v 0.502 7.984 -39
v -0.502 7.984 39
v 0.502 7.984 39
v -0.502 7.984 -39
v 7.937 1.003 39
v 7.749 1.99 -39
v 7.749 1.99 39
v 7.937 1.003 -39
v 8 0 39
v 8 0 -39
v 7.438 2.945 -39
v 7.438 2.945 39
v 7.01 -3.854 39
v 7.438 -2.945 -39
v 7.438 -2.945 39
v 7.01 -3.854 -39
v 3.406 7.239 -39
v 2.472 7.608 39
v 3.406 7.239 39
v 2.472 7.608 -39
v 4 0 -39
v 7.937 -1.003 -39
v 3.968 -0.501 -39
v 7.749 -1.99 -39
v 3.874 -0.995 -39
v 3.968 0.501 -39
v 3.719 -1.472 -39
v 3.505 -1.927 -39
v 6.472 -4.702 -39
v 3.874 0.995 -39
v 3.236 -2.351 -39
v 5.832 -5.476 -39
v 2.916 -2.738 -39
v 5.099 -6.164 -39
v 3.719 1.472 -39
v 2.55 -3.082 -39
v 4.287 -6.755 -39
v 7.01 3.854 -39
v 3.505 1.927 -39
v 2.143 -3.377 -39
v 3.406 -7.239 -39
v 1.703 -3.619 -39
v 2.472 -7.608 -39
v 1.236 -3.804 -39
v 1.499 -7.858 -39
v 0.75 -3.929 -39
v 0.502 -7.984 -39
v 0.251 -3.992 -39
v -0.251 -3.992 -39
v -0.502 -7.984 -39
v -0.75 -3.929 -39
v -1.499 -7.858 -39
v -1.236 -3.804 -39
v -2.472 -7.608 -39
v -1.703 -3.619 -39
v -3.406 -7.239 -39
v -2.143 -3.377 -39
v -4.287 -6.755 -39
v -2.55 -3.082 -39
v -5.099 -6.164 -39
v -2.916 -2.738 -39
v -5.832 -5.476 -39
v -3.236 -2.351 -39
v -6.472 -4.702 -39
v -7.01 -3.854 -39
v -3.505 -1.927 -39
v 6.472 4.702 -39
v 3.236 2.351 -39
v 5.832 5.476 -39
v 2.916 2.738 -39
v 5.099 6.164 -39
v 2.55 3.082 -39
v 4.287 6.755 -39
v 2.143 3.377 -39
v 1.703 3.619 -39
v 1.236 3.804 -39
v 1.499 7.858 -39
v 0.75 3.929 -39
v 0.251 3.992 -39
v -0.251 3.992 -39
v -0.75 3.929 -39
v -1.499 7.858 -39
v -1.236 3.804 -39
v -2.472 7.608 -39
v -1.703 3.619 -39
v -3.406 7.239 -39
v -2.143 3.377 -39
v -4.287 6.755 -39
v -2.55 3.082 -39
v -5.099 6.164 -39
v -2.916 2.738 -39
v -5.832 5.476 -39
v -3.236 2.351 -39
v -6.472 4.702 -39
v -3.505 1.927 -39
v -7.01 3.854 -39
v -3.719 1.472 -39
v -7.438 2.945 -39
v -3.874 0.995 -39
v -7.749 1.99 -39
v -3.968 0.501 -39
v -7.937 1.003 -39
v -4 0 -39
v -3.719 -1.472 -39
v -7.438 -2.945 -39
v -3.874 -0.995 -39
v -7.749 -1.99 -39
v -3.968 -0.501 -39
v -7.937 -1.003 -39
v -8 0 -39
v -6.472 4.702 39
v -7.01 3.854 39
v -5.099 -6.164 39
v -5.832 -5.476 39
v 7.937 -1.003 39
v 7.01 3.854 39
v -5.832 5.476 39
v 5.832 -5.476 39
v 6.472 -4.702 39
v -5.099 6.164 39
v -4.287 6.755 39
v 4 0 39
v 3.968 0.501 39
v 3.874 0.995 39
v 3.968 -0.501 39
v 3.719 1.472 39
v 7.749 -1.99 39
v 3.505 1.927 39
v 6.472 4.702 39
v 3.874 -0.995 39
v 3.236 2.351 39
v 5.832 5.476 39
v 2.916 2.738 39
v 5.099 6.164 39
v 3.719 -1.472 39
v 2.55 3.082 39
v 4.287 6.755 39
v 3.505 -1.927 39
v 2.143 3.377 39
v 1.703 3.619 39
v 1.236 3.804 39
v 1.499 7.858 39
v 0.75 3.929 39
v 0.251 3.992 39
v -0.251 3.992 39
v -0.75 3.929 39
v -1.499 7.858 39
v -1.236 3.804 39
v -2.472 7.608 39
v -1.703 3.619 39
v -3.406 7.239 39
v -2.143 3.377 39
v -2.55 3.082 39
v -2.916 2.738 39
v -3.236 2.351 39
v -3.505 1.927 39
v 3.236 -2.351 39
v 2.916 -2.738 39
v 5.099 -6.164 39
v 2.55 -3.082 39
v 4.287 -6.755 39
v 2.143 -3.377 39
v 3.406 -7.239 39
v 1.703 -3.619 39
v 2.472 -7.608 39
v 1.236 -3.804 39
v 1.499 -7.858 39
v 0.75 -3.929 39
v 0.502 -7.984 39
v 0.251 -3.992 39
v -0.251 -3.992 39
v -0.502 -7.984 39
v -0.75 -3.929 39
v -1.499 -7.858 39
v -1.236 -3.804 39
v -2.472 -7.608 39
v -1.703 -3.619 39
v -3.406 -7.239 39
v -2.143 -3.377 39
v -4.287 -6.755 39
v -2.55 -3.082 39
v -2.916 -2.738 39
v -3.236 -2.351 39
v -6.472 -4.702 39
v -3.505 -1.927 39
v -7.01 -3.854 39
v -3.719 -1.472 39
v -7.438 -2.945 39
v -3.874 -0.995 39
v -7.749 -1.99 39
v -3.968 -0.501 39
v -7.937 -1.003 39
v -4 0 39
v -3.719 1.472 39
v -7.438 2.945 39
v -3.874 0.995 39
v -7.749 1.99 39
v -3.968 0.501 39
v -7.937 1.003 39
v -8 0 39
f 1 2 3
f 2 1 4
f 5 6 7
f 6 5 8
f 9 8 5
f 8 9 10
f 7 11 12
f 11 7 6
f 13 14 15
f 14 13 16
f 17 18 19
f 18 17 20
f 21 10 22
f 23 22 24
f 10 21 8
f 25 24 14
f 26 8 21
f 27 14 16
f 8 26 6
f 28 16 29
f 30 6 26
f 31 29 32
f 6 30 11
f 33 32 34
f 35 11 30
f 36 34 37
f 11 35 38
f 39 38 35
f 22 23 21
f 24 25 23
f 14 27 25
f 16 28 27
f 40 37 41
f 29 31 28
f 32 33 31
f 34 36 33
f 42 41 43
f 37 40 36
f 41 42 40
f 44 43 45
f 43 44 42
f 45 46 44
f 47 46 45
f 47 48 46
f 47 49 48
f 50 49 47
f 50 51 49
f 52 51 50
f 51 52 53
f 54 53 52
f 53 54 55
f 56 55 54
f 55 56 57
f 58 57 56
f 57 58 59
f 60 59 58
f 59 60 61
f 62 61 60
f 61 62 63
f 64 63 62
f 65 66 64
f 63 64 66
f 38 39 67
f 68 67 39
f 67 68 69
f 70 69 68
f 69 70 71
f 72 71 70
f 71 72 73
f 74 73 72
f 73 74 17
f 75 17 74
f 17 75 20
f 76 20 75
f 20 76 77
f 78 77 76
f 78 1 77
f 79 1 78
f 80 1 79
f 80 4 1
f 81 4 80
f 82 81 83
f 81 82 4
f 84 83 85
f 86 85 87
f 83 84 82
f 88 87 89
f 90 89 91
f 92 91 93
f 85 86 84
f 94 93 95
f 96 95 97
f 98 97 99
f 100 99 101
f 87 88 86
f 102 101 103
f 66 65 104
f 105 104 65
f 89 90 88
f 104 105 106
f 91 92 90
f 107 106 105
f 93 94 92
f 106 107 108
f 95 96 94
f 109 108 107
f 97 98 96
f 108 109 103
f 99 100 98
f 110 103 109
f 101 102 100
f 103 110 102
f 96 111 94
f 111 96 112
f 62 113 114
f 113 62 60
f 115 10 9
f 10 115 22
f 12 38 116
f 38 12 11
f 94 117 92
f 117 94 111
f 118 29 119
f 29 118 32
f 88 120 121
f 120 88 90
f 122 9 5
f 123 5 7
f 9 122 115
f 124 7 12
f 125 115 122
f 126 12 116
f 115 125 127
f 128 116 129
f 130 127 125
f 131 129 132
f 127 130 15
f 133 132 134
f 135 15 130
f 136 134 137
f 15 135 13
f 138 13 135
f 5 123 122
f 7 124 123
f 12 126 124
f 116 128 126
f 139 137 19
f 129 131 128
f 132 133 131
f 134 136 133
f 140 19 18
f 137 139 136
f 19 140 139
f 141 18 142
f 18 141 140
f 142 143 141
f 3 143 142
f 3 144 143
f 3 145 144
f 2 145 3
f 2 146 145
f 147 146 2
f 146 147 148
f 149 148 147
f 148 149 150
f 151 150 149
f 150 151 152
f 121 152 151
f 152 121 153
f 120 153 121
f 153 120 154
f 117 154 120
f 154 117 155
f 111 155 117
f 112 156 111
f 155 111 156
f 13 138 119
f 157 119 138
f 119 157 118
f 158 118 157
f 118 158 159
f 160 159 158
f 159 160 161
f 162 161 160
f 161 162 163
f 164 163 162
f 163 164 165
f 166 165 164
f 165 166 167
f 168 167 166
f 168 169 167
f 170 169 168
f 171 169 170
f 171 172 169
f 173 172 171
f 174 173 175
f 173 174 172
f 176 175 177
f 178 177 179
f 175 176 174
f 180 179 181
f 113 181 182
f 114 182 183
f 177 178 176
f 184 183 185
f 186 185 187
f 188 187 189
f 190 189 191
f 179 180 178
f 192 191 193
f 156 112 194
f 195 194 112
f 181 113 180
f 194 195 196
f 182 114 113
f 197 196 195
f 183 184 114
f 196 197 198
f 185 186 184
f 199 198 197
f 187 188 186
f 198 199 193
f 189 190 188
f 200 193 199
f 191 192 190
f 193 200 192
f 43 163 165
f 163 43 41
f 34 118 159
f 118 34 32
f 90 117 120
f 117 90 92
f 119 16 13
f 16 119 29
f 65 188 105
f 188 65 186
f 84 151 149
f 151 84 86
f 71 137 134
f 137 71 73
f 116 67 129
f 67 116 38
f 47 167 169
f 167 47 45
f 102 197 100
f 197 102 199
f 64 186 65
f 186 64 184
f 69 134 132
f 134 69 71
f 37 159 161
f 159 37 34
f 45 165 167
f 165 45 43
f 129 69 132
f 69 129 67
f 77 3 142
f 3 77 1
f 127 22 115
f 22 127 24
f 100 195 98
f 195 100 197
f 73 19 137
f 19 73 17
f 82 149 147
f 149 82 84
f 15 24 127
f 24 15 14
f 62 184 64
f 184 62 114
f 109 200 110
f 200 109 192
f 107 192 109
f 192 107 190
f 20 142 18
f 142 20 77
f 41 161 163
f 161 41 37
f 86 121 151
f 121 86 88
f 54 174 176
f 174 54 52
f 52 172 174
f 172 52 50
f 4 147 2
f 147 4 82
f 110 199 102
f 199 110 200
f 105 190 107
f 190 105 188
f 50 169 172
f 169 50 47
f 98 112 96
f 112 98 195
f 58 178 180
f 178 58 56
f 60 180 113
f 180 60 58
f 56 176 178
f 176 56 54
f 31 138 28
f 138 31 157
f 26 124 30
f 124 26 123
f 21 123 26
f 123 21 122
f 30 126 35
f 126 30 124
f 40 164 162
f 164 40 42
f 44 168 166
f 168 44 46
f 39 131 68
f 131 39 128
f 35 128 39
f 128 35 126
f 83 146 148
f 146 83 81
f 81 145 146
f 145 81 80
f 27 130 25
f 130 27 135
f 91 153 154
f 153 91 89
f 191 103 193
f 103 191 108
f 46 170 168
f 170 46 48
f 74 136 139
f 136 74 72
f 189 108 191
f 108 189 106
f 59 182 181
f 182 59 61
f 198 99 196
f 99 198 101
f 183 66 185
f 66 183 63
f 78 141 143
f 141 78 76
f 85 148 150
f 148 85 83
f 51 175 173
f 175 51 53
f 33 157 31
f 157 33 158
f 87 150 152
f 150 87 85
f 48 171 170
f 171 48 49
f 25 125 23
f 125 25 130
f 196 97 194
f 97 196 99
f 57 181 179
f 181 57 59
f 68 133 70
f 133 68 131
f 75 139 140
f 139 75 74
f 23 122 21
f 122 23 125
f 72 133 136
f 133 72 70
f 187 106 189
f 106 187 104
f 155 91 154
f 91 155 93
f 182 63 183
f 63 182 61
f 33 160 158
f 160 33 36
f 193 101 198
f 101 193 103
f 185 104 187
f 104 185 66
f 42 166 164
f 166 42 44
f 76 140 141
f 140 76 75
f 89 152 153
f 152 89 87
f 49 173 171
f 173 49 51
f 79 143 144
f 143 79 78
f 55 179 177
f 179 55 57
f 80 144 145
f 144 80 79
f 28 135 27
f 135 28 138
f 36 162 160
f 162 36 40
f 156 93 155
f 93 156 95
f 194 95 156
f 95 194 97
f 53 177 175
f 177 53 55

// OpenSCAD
$fn = 50;


difference() {
	union() {
		translate(v = [0, 0, -39.0000000000]) {
			cylinder(h = 78, r = 8.0000000000);
		}
	}
	union() {
		translate(v = [0, 0, -100.0000000000]) {
			cylinder(h = 200, r = 4.0000000000);
		}
	}
}
